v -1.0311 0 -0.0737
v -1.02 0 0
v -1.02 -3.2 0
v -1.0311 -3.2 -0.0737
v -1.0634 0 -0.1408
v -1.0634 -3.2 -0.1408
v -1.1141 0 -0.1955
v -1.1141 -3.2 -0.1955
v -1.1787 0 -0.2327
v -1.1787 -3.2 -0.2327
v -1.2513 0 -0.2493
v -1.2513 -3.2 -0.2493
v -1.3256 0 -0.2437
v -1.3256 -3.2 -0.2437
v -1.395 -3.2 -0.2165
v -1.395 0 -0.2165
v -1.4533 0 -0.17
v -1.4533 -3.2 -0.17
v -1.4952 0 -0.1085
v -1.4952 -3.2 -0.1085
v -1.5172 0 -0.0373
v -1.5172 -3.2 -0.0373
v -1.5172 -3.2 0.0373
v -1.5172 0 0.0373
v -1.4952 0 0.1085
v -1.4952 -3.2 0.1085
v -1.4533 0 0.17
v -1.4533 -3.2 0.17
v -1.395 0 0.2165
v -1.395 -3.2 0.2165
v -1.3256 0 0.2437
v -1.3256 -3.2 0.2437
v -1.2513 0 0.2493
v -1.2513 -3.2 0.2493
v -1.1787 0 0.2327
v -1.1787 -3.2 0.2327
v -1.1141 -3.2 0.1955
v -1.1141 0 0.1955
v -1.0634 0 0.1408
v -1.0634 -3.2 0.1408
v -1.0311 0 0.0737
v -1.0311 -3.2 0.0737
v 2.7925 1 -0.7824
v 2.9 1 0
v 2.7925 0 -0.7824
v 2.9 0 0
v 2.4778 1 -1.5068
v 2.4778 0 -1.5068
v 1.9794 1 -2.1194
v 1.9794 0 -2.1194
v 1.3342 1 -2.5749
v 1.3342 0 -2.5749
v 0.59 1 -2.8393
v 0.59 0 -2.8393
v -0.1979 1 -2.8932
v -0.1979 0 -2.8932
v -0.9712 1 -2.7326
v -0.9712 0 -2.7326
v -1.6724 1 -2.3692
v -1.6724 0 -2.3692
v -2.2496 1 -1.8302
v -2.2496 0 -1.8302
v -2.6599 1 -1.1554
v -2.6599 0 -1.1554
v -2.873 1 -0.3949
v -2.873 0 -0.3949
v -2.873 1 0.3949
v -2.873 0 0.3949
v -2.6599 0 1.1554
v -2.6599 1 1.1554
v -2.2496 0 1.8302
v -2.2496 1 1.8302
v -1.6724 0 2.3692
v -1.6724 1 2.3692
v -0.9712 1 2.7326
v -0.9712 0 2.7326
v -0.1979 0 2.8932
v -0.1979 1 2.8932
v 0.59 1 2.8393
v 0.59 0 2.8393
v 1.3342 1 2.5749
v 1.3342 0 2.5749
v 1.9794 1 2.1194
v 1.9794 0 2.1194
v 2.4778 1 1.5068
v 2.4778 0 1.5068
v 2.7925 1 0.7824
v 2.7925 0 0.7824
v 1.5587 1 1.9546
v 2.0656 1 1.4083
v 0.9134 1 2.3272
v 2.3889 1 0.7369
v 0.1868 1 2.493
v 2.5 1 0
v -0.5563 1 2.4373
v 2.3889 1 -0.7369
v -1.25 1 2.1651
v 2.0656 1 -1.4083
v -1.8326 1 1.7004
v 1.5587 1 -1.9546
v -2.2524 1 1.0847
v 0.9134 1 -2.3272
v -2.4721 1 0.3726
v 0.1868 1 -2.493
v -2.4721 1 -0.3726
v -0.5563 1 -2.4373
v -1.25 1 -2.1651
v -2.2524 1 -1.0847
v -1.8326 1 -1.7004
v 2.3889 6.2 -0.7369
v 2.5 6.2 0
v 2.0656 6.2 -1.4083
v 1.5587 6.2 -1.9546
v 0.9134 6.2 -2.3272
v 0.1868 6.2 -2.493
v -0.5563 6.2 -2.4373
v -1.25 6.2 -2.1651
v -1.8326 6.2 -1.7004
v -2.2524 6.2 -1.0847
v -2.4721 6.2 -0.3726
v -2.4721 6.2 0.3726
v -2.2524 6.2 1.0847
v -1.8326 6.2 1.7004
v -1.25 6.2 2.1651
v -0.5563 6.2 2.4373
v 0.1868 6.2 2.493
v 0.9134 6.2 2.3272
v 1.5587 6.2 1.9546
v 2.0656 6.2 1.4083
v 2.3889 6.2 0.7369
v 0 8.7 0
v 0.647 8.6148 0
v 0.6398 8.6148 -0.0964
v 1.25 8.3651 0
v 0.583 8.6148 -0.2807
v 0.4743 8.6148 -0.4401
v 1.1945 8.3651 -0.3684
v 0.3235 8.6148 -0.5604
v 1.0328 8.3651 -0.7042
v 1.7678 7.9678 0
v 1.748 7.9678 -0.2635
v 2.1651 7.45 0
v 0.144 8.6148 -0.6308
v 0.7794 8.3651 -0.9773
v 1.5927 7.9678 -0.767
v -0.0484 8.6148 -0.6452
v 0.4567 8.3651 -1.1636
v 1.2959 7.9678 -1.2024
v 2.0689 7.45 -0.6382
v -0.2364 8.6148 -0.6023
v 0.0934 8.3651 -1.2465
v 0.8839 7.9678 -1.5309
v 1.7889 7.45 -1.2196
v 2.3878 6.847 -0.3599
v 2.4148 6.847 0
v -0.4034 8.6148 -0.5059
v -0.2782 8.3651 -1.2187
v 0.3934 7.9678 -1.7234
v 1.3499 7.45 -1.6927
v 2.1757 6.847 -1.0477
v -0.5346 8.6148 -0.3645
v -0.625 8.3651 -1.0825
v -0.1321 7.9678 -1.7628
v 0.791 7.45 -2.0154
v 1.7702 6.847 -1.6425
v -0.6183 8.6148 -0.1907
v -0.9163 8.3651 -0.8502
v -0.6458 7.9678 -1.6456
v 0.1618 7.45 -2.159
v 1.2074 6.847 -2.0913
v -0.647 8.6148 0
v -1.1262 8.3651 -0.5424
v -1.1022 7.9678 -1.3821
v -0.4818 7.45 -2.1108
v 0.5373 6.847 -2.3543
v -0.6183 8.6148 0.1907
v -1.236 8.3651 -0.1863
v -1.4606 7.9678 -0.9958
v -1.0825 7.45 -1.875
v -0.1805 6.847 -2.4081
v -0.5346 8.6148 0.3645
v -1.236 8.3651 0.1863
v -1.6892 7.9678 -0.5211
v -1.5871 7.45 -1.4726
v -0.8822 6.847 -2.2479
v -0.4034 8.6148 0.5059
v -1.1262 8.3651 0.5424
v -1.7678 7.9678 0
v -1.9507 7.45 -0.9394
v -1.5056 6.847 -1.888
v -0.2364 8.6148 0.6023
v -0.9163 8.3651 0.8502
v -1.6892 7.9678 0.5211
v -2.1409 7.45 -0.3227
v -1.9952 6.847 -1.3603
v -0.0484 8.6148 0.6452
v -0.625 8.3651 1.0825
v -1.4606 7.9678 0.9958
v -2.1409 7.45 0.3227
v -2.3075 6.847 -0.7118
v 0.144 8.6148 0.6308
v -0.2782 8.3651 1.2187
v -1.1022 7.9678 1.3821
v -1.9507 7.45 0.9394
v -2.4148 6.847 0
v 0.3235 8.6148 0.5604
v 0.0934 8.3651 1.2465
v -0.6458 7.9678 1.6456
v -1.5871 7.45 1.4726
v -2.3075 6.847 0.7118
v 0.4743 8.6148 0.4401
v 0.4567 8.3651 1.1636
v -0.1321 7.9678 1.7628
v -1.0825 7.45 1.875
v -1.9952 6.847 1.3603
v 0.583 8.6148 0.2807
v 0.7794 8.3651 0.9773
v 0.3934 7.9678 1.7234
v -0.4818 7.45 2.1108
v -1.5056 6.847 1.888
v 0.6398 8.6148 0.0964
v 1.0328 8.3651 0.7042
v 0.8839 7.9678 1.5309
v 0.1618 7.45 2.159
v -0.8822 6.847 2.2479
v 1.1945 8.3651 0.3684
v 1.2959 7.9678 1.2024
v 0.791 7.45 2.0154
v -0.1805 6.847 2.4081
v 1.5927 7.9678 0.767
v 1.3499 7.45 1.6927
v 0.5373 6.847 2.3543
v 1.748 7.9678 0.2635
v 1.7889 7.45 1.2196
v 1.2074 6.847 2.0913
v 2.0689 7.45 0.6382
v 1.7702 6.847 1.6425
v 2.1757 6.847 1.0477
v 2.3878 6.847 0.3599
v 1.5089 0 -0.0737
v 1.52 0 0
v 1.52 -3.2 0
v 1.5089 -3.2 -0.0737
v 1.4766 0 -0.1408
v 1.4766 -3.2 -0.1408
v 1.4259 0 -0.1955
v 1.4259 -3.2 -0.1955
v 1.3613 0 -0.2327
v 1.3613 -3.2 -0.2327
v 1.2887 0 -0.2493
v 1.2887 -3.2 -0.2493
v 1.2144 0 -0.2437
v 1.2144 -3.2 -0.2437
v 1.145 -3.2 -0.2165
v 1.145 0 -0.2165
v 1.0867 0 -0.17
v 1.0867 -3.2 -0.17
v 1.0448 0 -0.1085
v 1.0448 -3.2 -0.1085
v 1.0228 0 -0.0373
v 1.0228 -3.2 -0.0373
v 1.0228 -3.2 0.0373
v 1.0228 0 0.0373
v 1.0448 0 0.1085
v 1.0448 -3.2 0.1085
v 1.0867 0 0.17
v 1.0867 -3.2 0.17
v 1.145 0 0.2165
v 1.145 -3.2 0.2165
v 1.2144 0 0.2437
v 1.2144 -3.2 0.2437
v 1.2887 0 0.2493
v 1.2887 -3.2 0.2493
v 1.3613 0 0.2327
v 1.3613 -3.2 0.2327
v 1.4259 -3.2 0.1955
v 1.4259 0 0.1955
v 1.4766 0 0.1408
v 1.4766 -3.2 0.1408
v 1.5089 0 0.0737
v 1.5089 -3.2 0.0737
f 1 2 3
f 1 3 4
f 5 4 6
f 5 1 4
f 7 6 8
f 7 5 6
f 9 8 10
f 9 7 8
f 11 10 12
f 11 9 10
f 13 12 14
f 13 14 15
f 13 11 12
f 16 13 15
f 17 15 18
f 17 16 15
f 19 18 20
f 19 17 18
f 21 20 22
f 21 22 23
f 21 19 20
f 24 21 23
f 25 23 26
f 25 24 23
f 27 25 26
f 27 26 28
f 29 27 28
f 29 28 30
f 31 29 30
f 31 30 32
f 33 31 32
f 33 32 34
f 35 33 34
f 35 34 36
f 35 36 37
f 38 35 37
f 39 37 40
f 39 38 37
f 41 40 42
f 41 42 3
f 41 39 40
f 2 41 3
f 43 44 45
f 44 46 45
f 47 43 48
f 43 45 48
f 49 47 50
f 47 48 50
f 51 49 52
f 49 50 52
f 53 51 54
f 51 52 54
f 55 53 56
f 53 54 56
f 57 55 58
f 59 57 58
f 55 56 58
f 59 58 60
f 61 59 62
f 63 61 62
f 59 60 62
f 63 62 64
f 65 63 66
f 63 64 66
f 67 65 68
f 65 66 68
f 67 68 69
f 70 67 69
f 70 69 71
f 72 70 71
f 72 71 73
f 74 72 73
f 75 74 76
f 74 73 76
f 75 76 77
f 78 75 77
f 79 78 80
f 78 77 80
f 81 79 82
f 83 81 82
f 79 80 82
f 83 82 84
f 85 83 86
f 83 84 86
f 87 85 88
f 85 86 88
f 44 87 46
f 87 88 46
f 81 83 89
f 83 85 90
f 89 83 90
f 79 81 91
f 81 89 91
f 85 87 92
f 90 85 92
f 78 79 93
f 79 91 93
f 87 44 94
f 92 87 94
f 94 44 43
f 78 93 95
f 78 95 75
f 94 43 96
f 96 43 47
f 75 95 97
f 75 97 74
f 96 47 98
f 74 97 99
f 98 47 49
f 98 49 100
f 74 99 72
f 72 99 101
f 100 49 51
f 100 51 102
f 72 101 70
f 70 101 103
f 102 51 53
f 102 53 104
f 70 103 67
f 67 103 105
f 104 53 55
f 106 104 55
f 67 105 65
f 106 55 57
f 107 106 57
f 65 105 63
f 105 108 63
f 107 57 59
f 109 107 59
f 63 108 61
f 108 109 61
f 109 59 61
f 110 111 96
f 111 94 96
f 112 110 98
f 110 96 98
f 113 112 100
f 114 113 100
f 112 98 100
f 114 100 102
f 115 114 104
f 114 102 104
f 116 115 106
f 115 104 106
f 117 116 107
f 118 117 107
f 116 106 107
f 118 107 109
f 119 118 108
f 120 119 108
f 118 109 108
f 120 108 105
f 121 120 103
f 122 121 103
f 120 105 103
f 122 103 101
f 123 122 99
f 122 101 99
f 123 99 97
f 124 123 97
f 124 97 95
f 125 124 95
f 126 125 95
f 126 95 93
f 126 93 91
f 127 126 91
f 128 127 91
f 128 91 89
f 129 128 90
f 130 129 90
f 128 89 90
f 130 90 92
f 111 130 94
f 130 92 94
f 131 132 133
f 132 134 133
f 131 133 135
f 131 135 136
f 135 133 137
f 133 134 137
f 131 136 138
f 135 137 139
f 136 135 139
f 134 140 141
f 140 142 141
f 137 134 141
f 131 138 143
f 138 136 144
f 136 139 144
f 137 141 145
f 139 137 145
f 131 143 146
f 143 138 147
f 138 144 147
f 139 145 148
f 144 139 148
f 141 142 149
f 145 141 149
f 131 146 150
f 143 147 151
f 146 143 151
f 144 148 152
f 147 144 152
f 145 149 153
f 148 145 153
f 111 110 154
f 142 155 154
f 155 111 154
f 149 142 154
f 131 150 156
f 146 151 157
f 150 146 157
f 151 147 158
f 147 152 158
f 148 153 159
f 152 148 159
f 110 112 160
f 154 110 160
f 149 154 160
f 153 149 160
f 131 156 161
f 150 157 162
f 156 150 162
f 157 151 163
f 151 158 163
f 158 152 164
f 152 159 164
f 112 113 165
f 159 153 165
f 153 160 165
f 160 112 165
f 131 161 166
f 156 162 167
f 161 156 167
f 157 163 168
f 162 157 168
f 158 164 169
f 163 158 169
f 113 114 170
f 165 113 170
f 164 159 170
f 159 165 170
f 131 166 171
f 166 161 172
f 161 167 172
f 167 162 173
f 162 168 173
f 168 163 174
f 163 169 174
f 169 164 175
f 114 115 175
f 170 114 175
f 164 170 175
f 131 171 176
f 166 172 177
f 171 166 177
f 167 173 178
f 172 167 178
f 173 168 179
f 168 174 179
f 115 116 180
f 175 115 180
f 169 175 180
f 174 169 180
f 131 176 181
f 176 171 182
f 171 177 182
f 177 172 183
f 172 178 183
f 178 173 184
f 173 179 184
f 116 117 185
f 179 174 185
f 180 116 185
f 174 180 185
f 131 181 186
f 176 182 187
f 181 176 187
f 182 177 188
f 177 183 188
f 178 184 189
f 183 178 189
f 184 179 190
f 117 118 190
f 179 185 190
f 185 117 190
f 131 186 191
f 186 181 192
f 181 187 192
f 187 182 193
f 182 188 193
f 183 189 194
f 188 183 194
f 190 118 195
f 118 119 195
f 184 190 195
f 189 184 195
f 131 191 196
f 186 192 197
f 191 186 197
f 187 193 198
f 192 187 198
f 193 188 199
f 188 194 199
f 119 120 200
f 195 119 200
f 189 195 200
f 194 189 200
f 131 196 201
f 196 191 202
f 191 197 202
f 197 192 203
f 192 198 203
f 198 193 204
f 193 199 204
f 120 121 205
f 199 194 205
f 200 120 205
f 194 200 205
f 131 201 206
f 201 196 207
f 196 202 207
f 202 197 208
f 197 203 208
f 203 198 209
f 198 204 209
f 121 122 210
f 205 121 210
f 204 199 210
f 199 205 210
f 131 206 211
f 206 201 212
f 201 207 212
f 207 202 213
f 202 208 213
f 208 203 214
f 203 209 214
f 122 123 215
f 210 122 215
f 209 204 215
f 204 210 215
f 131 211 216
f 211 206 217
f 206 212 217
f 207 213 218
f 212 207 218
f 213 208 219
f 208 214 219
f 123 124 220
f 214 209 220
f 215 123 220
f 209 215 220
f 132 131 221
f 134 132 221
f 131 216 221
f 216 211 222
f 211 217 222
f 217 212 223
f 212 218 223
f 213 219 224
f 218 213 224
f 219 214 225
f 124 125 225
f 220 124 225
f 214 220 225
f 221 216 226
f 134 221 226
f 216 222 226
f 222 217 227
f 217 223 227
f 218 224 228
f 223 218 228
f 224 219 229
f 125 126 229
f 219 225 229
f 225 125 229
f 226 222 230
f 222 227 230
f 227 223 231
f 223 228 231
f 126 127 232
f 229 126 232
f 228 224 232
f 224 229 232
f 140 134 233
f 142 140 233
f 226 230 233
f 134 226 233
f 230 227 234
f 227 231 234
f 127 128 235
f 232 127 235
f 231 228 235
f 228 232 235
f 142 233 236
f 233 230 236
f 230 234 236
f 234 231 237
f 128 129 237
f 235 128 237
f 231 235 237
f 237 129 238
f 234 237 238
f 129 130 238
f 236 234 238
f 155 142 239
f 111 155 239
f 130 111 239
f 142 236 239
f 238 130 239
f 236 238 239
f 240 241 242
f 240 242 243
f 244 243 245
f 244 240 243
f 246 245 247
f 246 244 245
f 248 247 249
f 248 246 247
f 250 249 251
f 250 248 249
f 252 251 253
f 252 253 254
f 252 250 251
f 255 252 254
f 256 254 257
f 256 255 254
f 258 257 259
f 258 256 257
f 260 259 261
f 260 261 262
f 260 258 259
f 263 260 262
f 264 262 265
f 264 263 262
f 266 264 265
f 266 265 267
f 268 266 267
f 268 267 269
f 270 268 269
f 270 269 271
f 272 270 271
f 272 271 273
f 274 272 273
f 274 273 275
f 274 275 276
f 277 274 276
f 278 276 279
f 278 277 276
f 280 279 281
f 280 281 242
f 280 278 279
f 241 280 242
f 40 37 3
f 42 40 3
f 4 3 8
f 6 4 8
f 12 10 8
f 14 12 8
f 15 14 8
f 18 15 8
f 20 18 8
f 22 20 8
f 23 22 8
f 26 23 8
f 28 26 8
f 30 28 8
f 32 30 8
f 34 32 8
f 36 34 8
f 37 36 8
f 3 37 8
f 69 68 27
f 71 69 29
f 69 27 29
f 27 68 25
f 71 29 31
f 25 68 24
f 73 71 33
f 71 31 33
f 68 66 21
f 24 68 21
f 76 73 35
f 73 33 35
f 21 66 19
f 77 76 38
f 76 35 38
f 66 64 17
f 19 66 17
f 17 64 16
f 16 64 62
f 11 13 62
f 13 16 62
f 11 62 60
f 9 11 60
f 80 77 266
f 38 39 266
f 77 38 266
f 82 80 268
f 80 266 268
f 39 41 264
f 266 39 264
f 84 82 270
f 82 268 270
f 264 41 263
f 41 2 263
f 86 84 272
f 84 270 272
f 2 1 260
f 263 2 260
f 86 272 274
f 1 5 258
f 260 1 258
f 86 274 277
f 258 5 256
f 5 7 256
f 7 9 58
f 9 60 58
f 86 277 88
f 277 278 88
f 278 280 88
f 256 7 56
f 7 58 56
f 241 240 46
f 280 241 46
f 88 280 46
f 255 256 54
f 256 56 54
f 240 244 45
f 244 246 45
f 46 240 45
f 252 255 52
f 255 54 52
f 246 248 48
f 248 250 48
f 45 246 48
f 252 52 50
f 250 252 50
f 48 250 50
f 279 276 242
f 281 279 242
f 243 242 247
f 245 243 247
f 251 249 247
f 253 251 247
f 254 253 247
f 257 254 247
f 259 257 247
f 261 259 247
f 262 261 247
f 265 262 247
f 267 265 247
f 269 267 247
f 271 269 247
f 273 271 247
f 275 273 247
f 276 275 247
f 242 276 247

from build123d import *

# Parameters (mm, degrees)
SKETCH3_R           = 0.25
BOSS_EXTRUDE2_DEPTH = 3.2


with BuildPart() as part:
    # Sketch2 → Revolve1 (revolve)
    with BuildSketch(Plane.XY):
        with BuildLine():
            Line((2.5, 6.2), (2.5, 1))
            Line((2.5, 1), (2.9, 1))
            Line((2.9, 1), (2.9, 0))
            Line((2.9, 0), (0, 0))
            Line((0, 0), (0, 8.7))
            ThreePointArc((0, 8.7), (1.767766953, 7.967766953), (2.5, 6.2))
        make_face()
    revolve(axis=Axis((0, 0, 0), (0, 1, 0)))

    # Sketch3 → Boss-Extrude2 (add)
    with BuildSketch(Plane(origin=(0, 0, 0), x_dir=(1, 0, 0), z_dir=(0, 1, 0))):
        with Locations((-1.27, 0)):
            Circle(SKETCH3_R)
        with Locations((1.27, 0)):
            Circle(SKETCH3_R)
    extrude(amount=-BOSS_EXTRUDE2_DEPTH)


solid = part.part
